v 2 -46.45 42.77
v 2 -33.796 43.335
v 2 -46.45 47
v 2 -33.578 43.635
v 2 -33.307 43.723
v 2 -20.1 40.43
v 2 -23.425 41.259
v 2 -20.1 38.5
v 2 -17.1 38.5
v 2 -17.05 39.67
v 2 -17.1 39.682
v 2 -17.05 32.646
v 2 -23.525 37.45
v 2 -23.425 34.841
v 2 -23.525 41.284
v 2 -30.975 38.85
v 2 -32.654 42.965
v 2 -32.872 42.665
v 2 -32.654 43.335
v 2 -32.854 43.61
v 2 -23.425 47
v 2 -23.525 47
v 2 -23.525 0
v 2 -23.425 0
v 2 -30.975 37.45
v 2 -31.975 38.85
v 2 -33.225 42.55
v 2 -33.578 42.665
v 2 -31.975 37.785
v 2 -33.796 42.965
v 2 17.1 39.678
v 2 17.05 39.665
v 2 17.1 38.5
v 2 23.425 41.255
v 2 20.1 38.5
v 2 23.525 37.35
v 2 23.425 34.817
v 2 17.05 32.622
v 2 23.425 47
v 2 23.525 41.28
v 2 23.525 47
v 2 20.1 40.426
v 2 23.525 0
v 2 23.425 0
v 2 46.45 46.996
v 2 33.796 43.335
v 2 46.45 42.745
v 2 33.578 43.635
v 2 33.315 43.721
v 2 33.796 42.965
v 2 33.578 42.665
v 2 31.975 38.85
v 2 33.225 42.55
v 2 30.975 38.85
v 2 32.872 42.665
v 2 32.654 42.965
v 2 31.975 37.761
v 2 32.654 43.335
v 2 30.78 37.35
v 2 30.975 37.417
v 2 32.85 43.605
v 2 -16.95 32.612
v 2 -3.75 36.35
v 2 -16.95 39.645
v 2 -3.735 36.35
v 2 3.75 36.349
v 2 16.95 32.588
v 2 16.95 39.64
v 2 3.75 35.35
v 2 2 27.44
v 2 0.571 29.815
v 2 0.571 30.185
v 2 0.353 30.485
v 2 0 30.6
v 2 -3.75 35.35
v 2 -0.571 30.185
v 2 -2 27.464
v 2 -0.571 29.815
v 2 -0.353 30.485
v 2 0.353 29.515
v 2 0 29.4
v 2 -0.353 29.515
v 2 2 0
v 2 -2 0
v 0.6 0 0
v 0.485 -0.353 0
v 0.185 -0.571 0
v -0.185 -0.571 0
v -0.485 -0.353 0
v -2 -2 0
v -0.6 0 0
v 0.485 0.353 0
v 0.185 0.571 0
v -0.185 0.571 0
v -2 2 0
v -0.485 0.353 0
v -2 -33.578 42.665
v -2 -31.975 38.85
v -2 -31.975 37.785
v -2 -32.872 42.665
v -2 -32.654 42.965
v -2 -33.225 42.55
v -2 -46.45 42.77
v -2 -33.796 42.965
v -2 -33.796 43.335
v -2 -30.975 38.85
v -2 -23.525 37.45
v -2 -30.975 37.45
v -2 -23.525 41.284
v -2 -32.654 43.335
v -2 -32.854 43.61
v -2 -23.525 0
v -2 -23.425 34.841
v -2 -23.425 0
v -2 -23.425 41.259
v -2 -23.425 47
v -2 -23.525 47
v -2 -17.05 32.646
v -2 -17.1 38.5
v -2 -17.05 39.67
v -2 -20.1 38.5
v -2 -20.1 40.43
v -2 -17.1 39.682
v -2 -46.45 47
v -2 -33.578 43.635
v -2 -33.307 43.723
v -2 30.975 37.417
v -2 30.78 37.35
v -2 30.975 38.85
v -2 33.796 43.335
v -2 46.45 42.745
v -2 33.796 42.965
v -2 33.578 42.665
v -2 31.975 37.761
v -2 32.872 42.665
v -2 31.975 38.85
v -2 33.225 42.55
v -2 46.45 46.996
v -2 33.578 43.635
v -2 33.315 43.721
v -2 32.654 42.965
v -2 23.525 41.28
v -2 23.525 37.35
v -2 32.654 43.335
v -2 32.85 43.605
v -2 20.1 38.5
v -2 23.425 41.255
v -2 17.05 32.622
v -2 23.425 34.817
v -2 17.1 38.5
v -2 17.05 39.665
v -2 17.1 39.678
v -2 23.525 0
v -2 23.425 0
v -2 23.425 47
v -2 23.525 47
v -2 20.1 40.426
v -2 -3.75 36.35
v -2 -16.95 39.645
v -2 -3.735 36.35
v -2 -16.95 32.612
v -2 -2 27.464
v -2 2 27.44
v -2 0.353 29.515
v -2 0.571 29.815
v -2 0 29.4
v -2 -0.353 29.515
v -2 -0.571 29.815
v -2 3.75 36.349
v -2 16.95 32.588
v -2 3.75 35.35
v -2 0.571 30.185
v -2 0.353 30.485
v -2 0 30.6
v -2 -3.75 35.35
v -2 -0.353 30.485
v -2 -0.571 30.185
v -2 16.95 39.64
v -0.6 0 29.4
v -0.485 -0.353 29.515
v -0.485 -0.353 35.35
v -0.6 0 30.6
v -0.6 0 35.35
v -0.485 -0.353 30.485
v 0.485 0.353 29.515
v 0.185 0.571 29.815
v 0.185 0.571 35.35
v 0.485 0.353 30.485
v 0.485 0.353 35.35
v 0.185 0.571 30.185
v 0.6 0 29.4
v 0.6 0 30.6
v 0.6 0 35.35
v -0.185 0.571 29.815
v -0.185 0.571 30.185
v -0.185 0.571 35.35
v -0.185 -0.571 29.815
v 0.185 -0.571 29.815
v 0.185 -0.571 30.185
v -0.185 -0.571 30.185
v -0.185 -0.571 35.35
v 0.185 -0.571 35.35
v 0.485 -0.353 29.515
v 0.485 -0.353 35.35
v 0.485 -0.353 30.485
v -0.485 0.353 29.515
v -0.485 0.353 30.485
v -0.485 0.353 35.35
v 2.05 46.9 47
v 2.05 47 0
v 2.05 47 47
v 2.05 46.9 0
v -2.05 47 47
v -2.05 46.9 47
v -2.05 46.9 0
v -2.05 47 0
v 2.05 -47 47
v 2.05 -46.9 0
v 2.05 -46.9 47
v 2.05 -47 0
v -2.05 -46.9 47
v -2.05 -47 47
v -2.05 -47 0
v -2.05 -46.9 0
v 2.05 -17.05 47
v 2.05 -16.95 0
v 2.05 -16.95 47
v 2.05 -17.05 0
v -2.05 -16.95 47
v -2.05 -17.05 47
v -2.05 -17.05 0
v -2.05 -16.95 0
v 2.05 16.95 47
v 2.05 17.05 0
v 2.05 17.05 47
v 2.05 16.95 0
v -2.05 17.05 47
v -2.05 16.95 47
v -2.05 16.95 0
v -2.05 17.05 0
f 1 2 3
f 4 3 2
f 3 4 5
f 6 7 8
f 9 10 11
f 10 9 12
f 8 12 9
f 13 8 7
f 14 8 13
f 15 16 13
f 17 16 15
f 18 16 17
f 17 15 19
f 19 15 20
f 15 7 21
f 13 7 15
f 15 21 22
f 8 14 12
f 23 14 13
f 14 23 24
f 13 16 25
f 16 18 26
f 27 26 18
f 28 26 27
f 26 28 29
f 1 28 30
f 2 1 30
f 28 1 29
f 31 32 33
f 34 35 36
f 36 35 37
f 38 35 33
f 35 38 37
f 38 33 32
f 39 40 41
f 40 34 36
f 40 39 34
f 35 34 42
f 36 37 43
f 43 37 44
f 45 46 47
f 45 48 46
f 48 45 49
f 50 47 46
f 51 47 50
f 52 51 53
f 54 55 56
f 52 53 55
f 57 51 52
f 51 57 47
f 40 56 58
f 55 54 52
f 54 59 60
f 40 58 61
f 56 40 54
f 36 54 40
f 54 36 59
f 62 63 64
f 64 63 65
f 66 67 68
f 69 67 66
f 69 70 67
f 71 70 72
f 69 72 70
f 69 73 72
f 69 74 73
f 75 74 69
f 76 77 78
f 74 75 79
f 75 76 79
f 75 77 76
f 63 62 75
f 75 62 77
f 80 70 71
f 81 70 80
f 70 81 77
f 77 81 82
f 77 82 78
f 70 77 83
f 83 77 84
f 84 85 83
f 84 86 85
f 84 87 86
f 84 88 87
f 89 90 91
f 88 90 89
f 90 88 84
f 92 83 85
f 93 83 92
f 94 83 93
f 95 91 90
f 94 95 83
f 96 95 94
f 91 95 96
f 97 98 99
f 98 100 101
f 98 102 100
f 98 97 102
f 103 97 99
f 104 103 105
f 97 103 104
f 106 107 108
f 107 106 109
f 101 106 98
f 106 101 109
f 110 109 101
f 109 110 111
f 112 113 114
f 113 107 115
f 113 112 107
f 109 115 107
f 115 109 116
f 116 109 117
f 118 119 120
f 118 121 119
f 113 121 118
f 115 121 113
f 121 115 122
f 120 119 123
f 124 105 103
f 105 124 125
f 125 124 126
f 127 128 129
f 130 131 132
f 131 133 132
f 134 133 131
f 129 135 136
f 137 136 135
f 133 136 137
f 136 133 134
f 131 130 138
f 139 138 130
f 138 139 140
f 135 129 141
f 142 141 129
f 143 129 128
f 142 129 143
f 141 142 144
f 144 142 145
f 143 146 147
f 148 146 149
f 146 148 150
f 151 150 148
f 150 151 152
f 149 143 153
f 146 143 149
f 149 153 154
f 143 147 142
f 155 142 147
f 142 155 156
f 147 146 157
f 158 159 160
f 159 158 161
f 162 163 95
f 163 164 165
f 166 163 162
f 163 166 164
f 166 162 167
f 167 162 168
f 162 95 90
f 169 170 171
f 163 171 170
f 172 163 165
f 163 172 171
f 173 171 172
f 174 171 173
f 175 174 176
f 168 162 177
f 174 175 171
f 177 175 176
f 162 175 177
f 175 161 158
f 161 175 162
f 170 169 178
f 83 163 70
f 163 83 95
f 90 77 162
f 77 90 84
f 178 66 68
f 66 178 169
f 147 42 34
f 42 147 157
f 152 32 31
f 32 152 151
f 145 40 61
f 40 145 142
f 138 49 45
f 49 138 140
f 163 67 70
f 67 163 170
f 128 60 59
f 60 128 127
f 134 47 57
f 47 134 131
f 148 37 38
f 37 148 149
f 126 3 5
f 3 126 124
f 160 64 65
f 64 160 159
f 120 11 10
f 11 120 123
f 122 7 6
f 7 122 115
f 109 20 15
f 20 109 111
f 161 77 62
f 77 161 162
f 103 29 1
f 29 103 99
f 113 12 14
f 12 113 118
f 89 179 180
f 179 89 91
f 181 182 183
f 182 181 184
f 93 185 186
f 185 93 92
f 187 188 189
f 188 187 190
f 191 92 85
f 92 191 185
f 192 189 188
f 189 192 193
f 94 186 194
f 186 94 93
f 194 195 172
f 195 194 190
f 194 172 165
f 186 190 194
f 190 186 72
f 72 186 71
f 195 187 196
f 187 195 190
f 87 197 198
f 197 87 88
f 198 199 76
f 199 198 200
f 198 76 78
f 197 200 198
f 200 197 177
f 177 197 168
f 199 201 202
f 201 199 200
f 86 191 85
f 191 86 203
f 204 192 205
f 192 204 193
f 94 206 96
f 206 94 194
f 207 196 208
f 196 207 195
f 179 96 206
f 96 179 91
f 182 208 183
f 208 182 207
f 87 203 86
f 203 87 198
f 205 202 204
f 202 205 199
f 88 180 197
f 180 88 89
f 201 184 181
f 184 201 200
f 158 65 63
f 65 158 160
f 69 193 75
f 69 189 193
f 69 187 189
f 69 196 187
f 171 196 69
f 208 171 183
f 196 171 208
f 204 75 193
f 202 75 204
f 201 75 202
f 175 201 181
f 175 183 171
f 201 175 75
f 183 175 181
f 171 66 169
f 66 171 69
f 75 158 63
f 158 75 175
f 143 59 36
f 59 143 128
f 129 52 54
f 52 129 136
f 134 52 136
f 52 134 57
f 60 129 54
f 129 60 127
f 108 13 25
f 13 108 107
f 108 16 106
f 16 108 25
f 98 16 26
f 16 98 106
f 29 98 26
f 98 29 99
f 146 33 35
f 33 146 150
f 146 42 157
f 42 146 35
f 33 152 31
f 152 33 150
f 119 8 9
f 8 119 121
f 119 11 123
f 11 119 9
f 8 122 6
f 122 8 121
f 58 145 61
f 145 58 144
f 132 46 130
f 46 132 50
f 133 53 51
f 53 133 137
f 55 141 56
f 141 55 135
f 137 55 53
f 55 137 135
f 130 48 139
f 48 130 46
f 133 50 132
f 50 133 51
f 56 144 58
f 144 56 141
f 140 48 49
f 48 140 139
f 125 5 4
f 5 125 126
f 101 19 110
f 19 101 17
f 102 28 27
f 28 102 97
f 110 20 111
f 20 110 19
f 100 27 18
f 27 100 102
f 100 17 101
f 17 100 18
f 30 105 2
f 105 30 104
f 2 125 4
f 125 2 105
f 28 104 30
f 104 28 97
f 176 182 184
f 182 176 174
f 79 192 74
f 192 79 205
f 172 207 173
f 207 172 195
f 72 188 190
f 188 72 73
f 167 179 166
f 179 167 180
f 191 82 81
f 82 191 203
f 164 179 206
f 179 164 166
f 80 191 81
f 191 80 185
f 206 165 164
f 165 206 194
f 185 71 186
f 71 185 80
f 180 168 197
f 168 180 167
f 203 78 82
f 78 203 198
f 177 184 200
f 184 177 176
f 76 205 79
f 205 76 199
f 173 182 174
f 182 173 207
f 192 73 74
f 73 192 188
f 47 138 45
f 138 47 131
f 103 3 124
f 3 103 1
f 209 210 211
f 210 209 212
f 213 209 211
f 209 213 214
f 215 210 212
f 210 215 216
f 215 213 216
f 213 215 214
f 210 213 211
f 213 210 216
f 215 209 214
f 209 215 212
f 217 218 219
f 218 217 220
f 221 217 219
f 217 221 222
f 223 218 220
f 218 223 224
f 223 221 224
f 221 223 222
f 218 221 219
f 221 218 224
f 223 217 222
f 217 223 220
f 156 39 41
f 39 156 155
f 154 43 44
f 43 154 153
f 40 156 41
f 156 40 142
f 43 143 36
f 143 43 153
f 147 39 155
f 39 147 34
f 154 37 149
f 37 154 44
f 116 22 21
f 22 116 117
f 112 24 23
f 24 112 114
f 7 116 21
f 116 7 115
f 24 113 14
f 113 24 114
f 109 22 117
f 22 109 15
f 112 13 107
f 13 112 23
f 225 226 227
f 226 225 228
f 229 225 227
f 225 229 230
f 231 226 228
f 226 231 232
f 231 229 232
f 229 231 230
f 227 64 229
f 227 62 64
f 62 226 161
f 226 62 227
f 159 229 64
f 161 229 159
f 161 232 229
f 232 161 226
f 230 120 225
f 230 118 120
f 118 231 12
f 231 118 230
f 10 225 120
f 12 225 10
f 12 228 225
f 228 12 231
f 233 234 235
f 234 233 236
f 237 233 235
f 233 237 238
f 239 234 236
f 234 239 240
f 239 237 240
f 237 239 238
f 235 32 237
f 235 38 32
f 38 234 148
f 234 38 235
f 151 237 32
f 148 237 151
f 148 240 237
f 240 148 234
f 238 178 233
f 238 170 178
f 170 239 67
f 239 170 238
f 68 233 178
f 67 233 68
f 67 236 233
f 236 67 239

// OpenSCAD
// file: fb_globals.scad
/// @file fb_globals.scad
///
/// @brief project footbridge globals
///
/// @author © Dave Harris 2022
///
/// Included in all project files.


$fa = 1;   // Fragment angle
$fs = 0.4; // Fragment size resolution

// global constants
//------------------

H_canopy = 47;

H_bridge = 49.5; // platform<>bridge
W_bridge = 36;   // width of bridge
                 // > walkway
W_walk   = 34.5; // width
H_walk   = 36;   // height of walkway


Steps    = 27;   // number of steps
W_stairs = 32;   // width ~ 9'6" @ H0
L_tread  = 3.5;  // tread ~ 12" @ H0
L_stairs = L_tread * (Steps +1);
H_rise   = H_bridge / (Steps +1); 
  // rise is 1.7678, not H0 1.75 (6")

W_lift   = 34;

W_build  = W_stairs +2;
L_build  = L_stairs+W_bridge+W_lift +2;

W_pillar = 4;

L_spacing = L_build /2;

Spans = 6;

L_canopy = ((Spans -1) * L_spacing) + W_pillar;

echo("len",L_canopy);

H_door   = 28;
W_door   = 18;

H_window = 6;
W_window = 16;


W_plat45  = 93.9;
W_track34 = 87.9;
W_plat23  = 93.8;
W_track12 = 87.9;

W_plat23edge =
   ( W_plat23 - W_stairs +2 ) /2 ;
W_plat45edge =
   ( W_plat45 - W_stairs +2 ) /2 ;
   
L_span34 = W_track34 + W_plat45edge + W_plat23edge;

L_span12 = 136.5;

W_grider = 2.2;

W_LEDstrip = 7.5;



// eof
// main file
/// @file fb_canopySpan2.scad
///
/// @brief platform canopy2 span
///
/// @author © Dave Harris 2022
/// 

include<fb_globals.scad>


// local test
 
canopySpan2(Wplat = W_plat45 -1 );


//wallSpan(85);

//stairSpan(Wplat = W_plat45);

//endFasia(Wplat = W_plat45);


color("blue") // constructlines
{
  {
    translate( // ends
      [ 0
      , W_plat45 /2
      , H_canopy /2 ]
    ) cube(
        [ W_pillar +0.1
        , 0.1
        , H_canopy ], center=true
      );
      
    translate( // ends
      [ 0
      , - W_plat45 /2
      , H_canopy /2 ]
    ) cube(
        [ W_pillar +0.1
        , 0.1
        , H_canopy ], center=true
      );
  }
  
  {
    translate( // lights
      [ 0
      , W_plat45/4
      , H_canopy/2  ]
    ) cube(
        [ W_pillar
        , 0.1
        , H_canopy ], center=true
      );

    translate( // lights
      [ 0
      , -W_plat45/4
      , H_canopy/2  ]
    ) cube(
        [ W_pillar
        , 0.1
        , H_canopy ], center=true
      );
  }

  { // W_build construction
    
    translate(
      [ 0
      , -(W_build /2)
      , H_canopy /2  ]
    ) cube(
        [ W_pillar +0.1
        , 0.1
        , H_canopy ], center=true
      );
    
    translate(
      [ 0
      , (W_build /2)
      , H_canopy /2  ]
    ) cube(
        [ W_pillar +0.1
        , 0.1
        , H_canopy ], center=true
      );
  }
}    


// a full width canopy2 span
//----------------------------

module canopySpan2(
          , Wplat
          , Wgully = 3
       )
{
  difference()
  {
    union()
    {
      translate( // center pillar
        [ 0
        , 0
        , H_door/2  ]
      ) cube(
          [ W_pillar
          , W_pillar
          , H_door ], center=true
        );
      
      { // offside
        translate( // upper
          [ -(W_pillar /2)
          , (Wplat /2) +1.03
          , H_canopy-W_pillar+0.13]
        ) rotate(
            [ 104
            , 0
            , 0  ]
          ) cube(
              [ W_pillar
              , W_pillar
              , 50 ]
            );
        
        translate( // lower
          [ - (W_pillar /2)
          , (Wplat /2) +1.32
          , H_canopy-W_pillar +0.2]
        ) rotate(
            [ 109
            , 0
            , 0  ]
          ) cube(
              [ W_pillar
              , W_pillar
              , 51 ]
            );
      }
      { // near side
        translate( // upper
          [ - (W_pillar /2) 
          , -(Wplat /2)
          , H_canopy  ]
        ) rotate(
            [ -104
            , 0
            , 0  ]
          ) cube(
              [ W_pillar
              , W_pillar
              , 50 ]
            );
        
        translate( // lower 
          [ - (W_pillar /2)
          , - (Wplat /2)
          , H_canopy ]
        ) rotate(
            [ -109
            , 0
            , 0  ]
          ) cube(
              [ W_pillar
              , W_pillar
              , 51 ]
            );
      }
      
      translate( // infill
        [ 0
        , 0
        , H_door +2.8  ]
      ) cube(
          [ W_pillar
          , 11
          , 4 ], center=true
        );
  
    } // end union

    translate( // mount hole
      [ 0
      , 0
      , -1  ]
    ) cylinder(
          r = 0.6
        , h = H_canopy
      );
    
    translate( // central gully
      [ 0
      , 0
      , 35.85  ]
    ) cube(
        [ 8
        , W_LEDstrip
        , 1  ], center=true
      );
    
    {
      translate( // support
        [ -4
        , (Wplat /4) +0.25
        , 34.85 ]
      ) cube(
          [ 8
          , W_LEDstrip
          , 2.5 ]
        );
  
      translate( // light guard
        [ -4
        , (Wplat/4)+W_LEDstrip+0.25
        , 34.85 ]
      ) cube(
          [ 8
          , 1
          , 4 ]
        );
    
      translate( // LED support
        [ -4
        ,-(Wplat/4)-W_LEDstrip-0.25
        , 34.85 ]
      ) cube(
          [ 8
          , W_LEDstrip
          , 2.6 ]
        );
      translate( // light guard
        [ -4
        ,-(Wplat/4)-W_LEDstrip-1.25
        , 34.85 ]
      ) cube(
          [ 8
          , 1
          , 4 ]
        );
    }
    
    { // wall gully
      translate( //
        [ -4
        , (W_build /2) +0.1
        , 38.5 ]
      ) cube(
          [ 9
          , Wgully
          , 2 ]
        );
      
      translate( // wall gully
        [ -4
        , -(W_build /2) -3.1
        , 38.5 ]
      ) cube(
          [ 9
          , Wgully
          , 2 ]
        );
    }

    {
      translate(
        [ -4
        , (Wplat/4) +10
        , 43.15  ]
      ) rotate(
          [ 0
          , 90
          , 0 ]
        ) cylinder(
            r = 0.6
           , h = 9
          );
        
      translate(
        [ -4
        , -(Wplat/4) -10
        , 43.15  ]
      ) rotate(
          [ 0
          , 90
          , 0 ]
        ) cylinder(
            r = 0.6
           , h = 9
          );

      translate(
        [ -4
        , 0
        , 30  ]
      ) rotate(
          [ 0
          , 90
          , 0 ]
        ) cylinder(
            r = 0.6
           , h = 9
          );          
    }
    
    { // remove surplus ends
      translate(
        [ -5
        , Wplat/2
        , 0  ]
      ) cube(
          [ 10
          , 10
          , H_canopy +5]
        );
      
      translate(
        [ -5
        , -Wplat/2 -10
        , 0  ]
      ) cube(
          [ 10
          , 10
          , H_canopy +5]
        );
    }
    
  } // end difference

} // end module canopySpan2


module stairSpan()
{
  difference() // stair span
  {
    translate(
      [ -2
      , 0
      , 0 ]
    ) canopySpan2(
          Wplat = W_plat45
        );
    
    translate(
      [ -6
      , -(W_plat45 /2)
      , -0.2  ]
    ) cube(
        [ 7
        , W_plat45
        , H_door +5 ]
      );
  }
} // end module stairSpan


module wallSpan(Xpos)
{
  difference() // stair span
  {
    translate(
      [ Xpos
      , 0
      , 0 ]
    ) canopySpan2(
          Wplat = W_plat45
        );
    
    translate( 
      [ Xpos -5
      , -(W_build /2) -0.11
      , -0.1  ]
    ) cube(
        [ 9
        , W_build +0.22
        , H_canopy ]
      );
  }

} // end module wallSpan



module endFasia(Wplat)
{
  difference()
  {
    union()
    {
      { // offside
        translate( // upper
          [ 0
          , (Wplat /2) +1.03
          , H_canopy-W_pillar+0.5]
        ) rotate(
            [ 104
            , 0
            , 0  ]
          ) cube(
              [ 0.5
              , W_pillar
              , 50 ]
            );
        
        translate( // lower
          [ 0
          , (Wplat /2) +1.32
          , H_canopy-W_pillar -0.5]
        ) rotate(
            [ 109
            , 0
            , 0  ]
          ) cube(
              [ 0.5
              , W_pillar
              , 51 ]
            );
      }
      { // near side
        translate( // upper
          [ 0 
          , -(Wplat /2)
          , H_canopy +0.5 ]
        ) rotate(
            [ -104
            , 0
            , 0  ]
          ) cube(
              [ 0.5
              , W_pillar
              , 50 ]
            );
        
        translate( // lower 
          [ 0
          , - (Wplat /2)
          , H_canopy -0.5 ]
        ) rotate(
            [ -109
            , 0
            , 0  ]
          ) cube(
              [ 0.5
              , W_pillar
              , 51 ]
            );
      }
      
      translate( // infill
        [ 0
        , -16
        , H_door +4.5  ]
      ) cube(
          [ 0.5
          , 32
          , 6 ]
        );
      
      translate( // infill
        [ 0
        , -8
        , H_door +1  ]
      ) cube(
          [ 0.5
          , 16
          , 6 ]
        );
    } // end union
    
    { // remove surplus ends
      translate(
        [ -5
        , Wplat/2
        , 0  ]
      ) cube(
          [ 10
          , 10
          , H_canopy +5]
        );
      
      translate(
        [ -5
        , -Wplat/2 -10
        , 0  ]
      ) cube(
          [ 10
          , 10
          , H_canopy +5]
        );
      translate(
        [ -1, -10, 0 ]
      ) cube(
          [ 4, 20, H_door ]
        );
    }
    
    
  } // end difference
}


// eof
